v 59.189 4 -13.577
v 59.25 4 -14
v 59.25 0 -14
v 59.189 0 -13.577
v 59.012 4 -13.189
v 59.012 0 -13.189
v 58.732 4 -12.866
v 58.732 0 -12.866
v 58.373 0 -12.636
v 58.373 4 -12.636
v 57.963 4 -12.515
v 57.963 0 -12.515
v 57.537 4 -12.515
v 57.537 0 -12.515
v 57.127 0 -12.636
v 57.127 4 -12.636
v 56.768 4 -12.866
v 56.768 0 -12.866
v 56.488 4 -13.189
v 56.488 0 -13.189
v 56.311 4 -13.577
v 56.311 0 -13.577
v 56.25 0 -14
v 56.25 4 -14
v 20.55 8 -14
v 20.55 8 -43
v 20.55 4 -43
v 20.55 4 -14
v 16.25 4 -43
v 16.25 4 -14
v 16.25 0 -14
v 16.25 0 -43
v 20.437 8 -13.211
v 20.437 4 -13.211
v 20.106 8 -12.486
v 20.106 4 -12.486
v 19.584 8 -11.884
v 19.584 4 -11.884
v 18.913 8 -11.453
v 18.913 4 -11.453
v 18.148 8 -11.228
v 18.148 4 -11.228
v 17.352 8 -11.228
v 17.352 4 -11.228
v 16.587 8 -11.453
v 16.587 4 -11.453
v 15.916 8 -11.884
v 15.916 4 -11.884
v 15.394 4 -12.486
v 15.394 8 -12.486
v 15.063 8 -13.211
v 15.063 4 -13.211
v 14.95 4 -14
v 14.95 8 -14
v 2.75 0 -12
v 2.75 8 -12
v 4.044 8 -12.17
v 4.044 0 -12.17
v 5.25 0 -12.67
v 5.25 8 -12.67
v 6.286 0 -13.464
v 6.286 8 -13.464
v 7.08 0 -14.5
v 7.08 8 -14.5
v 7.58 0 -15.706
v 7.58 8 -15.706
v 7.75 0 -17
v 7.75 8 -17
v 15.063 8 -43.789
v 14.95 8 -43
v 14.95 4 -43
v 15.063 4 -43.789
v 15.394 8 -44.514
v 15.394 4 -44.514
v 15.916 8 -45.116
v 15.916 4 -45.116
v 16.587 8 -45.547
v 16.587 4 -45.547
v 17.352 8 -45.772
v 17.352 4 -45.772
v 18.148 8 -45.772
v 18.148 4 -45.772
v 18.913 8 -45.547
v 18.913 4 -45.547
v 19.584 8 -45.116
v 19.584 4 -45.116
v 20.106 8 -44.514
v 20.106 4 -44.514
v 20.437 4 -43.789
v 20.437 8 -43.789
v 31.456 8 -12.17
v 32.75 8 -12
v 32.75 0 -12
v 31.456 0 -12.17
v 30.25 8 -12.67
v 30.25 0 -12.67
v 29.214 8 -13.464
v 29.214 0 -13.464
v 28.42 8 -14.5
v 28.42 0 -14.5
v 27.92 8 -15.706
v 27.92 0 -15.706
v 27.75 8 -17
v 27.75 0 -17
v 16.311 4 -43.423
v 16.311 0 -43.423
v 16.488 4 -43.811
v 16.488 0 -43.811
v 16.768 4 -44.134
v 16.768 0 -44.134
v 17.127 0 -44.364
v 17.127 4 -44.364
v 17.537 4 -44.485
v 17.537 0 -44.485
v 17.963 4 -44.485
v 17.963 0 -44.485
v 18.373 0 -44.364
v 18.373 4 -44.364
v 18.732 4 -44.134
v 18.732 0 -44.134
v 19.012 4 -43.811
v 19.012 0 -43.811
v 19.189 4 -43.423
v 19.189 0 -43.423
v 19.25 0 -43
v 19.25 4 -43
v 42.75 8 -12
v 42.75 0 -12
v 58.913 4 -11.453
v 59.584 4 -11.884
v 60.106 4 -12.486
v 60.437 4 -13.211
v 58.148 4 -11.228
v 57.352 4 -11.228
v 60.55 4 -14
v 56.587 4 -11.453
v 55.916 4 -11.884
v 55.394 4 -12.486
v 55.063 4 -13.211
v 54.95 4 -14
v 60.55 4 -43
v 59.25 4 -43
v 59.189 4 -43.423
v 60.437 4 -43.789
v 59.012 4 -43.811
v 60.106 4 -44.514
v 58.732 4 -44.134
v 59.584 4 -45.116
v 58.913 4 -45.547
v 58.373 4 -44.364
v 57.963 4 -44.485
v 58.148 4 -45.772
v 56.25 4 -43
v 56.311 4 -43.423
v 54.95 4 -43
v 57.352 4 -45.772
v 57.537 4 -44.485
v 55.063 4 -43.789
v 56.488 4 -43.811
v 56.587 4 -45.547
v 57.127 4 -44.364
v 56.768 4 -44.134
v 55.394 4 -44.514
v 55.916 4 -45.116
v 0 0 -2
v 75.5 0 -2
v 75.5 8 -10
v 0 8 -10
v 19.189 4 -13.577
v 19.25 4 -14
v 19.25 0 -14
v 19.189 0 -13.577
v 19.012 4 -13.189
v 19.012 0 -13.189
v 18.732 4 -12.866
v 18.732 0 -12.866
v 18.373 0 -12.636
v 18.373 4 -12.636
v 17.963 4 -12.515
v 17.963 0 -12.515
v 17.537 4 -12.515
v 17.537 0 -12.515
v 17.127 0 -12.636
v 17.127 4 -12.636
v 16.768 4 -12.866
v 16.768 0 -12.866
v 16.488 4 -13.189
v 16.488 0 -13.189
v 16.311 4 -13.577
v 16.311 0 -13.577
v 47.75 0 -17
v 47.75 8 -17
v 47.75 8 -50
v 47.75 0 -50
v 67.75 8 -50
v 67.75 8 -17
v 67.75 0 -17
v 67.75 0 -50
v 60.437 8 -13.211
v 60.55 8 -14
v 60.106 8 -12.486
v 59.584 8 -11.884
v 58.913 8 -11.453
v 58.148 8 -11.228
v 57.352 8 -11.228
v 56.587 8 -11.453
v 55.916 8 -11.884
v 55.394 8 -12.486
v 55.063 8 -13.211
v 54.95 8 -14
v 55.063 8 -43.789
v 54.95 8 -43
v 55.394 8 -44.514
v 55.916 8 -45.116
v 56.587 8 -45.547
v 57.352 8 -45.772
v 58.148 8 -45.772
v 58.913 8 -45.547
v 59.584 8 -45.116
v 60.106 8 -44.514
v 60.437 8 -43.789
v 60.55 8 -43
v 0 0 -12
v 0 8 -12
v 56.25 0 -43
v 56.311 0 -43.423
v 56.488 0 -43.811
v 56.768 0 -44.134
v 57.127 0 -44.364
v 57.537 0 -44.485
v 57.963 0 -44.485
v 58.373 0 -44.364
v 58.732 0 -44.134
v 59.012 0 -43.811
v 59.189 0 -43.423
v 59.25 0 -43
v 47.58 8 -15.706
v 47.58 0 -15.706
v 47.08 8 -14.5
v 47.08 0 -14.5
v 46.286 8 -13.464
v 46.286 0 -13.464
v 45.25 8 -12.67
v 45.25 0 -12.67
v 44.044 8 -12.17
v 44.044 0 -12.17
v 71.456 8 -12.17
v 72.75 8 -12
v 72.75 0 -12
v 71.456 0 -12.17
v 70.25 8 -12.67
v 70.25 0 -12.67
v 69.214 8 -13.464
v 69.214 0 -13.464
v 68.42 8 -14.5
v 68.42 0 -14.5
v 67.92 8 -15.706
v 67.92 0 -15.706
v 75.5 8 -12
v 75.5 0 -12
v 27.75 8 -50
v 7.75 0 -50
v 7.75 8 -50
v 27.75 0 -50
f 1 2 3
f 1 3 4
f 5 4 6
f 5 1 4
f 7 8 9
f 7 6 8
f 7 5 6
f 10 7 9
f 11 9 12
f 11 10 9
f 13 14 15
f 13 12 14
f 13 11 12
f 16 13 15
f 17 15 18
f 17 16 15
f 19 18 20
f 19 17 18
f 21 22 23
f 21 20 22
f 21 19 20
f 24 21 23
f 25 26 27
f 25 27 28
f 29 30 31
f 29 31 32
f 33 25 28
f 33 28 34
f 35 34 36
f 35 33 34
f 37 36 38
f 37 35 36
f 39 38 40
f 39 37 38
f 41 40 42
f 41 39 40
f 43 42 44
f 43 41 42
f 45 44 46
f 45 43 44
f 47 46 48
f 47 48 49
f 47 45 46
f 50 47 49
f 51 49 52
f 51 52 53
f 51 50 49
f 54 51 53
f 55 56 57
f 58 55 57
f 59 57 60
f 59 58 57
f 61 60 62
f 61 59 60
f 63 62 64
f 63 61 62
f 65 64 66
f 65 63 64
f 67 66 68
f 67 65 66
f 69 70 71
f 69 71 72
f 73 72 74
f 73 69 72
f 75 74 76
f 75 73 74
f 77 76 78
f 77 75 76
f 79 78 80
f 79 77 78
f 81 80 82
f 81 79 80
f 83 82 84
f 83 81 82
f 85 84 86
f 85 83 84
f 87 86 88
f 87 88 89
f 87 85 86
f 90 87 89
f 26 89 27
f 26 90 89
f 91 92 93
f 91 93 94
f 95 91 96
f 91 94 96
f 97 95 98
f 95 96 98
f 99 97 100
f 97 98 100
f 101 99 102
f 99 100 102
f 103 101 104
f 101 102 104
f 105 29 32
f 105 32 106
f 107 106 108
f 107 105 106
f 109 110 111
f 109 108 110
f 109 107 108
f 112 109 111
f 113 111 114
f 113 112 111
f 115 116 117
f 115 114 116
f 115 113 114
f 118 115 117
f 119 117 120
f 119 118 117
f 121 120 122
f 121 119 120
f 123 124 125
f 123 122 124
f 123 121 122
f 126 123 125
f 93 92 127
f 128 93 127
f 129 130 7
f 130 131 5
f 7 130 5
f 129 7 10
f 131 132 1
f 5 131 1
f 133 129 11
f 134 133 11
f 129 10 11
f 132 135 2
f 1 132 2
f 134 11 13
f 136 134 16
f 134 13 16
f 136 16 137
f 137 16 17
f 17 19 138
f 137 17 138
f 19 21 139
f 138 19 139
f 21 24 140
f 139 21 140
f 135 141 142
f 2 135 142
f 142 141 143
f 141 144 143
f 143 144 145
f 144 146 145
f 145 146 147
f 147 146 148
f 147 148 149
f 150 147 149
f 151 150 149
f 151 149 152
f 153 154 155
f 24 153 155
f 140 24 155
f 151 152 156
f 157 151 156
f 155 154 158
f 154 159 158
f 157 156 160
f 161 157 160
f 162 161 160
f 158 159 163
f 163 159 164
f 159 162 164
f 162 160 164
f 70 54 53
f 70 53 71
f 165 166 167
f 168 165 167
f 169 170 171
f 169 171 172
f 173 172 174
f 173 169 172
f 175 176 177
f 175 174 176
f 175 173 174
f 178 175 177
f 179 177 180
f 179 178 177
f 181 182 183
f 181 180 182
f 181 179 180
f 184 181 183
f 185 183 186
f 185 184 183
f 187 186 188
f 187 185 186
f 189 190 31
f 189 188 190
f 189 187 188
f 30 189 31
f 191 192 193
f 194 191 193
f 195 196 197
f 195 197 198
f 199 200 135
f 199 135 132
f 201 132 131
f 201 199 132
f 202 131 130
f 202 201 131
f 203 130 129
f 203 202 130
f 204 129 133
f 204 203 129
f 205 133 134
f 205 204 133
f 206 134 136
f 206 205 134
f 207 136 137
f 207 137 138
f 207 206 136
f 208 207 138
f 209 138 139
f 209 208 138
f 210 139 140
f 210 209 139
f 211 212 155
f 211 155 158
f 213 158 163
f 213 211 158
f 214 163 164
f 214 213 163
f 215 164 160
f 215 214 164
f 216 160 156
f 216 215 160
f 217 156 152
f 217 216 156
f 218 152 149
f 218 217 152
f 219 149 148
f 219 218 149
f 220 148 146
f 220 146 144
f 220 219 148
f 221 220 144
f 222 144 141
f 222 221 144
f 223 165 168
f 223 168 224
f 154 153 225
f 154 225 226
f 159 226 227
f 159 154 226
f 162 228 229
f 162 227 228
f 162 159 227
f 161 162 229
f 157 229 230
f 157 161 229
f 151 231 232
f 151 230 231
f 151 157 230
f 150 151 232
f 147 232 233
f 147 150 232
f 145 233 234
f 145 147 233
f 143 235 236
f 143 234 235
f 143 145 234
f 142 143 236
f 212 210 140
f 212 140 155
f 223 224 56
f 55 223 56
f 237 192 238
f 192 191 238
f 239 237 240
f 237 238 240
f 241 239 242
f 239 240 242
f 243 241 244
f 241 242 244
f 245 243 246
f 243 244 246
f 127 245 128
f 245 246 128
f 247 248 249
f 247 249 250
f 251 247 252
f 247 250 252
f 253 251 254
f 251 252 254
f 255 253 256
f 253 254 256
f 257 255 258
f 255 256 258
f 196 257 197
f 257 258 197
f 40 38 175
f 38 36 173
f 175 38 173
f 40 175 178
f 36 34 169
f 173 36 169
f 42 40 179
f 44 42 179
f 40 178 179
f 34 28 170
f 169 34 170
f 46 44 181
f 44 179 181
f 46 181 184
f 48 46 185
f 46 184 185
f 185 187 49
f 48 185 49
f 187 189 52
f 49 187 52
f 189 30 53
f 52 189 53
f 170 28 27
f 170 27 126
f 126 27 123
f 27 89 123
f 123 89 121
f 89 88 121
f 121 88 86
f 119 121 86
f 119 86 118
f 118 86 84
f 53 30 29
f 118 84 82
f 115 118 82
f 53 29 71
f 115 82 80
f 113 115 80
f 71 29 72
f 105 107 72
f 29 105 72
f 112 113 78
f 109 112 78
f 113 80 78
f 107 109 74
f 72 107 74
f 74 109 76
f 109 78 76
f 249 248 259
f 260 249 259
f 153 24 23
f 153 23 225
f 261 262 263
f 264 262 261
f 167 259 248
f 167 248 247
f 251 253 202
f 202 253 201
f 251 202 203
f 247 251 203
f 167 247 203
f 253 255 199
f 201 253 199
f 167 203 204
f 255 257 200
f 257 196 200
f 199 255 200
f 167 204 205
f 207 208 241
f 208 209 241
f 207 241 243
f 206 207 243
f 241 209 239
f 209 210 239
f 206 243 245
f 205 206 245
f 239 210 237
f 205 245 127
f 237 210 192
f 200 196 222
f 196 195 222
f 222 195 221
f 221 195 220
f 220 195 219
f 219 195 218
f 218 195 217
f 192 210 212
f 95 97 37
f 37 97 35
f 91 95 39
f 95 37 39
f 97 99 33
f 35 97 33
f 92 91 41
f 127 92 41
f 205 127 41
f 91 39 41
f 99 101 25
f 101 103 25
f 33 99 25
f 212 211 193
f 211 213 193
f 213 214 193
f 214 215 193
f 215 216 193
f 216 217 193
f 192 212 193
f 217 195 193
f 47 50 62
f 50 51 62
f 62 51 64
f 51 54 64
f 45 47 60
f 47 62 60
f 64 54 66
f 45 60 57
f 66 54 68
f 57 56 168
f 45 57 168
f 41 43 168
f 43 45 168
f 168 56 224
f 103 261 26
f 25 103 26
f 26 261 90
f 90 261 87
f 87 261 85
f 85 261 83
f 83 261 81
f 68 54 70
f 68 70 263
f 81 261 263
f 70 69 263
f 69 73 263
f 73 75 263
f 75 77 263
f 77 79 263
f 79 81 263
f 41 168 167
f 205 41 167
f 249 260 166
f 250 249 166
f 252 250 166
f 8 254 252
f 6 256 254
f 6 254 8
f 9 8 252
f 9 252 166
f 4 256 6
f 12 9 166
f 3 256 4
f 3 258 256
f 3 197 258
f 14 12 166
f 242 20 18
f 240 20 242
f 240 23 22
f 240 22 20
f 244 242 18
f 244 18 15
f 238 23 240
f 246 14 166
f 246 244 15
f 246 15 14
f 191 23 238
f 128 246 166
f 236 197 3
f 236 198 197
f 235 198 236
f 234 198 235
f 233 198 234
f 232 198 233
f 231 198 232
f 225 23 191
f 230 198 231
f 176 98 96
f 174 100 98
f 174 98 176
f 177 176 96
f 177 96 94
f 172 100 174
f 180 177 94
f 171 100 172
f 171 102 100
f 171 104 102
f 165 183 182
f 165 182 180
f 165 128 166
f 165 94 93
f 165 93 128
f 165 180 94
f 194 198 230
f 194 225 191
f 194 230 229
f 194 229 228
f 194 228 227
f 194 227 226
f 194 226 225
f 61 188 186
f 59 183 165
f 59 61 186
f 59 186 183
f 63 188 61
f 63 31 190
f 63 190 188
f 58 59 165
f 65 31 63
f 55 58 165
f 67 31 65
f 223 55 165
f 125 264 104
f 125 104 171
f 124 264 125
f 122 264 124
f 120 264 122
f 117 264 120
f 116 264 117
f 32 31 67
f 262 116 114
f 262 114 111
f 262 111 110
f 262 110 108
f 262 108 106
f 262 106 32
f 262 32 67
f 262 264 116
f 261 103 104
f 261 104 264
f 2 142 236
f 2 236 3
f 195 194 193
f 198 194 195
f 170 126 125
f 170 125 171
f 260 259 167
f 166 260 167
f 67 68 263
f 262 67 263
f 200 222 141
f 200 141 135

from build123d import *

# Parameters (mm, degrees)
BOSS_EXTRUDE1_DEPTH = 8
CUT_EXTRUDE2_REACH  = 92.908
SKETCH5_W           = 20
SKETCH5_H           = 38
SKETCH5_W_2         = 7.75
CUT_EXTRUDE3_DEPTH  = 10
FILLET1_R           = 5
CHAMFER1_SIZE       = 10
CUT_EXTRUDE4_DEPTH  = 4


with BuildPart() as part:
    # Sketch1 → Boss-Extrude1 (new body)
    with BuildSketch(Plane(origin=(0, 0, 0), x_dir=(1, 0, 0), z_dir=(0, 1, 0))):
        Polygon((0, 0), (0, 50), (75.5, 50), (75.5, 0), (37.75, 0), align=None)
    extrude(amount=BOSS_EXTRUDE1_DEPTH)

    # Sketch4 → Cut-Extrude2 (cut, up to next)
    with BuildSketch(Plane(origin=(0, 8, 0), x_dir=(1, 0, 0), z_dir=(0, 1, 0)), mode=Mode.PRIVATE) as cut_extrude2_sk1:
        with BuildLine():
            Line((19.25, 43), (19.25, 14))
            ThreePointArc((19.25, 14), (17.75, 12.5), (16.25, 14))
            Line((16.25, 14), (16.25, 43))
            ThreePointArc((16.25, 43), (17.75, 44.5), (19.25, 43))
        make_face()
    cut_extrude2_tool1 = extrude(cut_extrude2_sk1.sketch, amount=-CUT_EXTRUDE2_REACH, mode=Mode.PRIVATE) & part.part
    # Sketch4 → Cut-Extrude2 (cut, up to next)
    with BuildSketch(Plane(origin=(0, 8, 0), x_dir=(1, 0, 0), z_dir=(0, 1, 0)), mode=Mode.PRIVATE) as cut_extrude2_sk2:
        with BuildLine():
            Line((59.25, 43), (59.25, 14))
            ThreePointArc((59.25, 14), (57.75, 12.5), (56.25, 14))
            Line((56.25, 14), (56.25, 43))
            ThreePointArc((56.25, 43), (57.75, 44.5), (59.25, 43))
        make_face()
    cut_extrude2_tool2 = extrude(cut_extrude2_sk2.sketch, amount=-CUT_EXTRUDE2_REACH, mode=Mode.PRIVATE) & part.part
    add(cut_extrude2_tool1.solids().sort_by_distance((17.75, 8, -28.5))[0], mode=Mode.SUBTRACT)
    add(cut_extrude2_tool2.solids().sort_by_distance((57.75, 8, -28.5))[0], mode=Mode.SUBTRACT)

    # Sketch5 → Cut-Extrude3 (cut)
    with BuildSketch(Plane(origin=(0, 8, 0), x_dir=(1, 0, 0), z_dir=(0, 1, 0))):
        with Locations((37.75, 31)):
            Rectangle(SKETCH5_W, SKETCH5_H)
        with Locations((71.625, 31)):
            Rectangle(SKETCH5_W_2, SKETCH5_H)
        with Locations((3.875, 31)):
            Rectangle(SKETCH5_W_2, SKETCH5_H)
    extrude(amount=-CUT_EXTRUDE3_DEPTH, mode=Mode.SUBTRACT)

    # Fillet1
    fillet1_edges = [part.edges().sort_by_distance(p)[0] for p in [
        (27.75, 4, -12),
        (47.75, 4, -12),
        (7.75, 4, -12),
        (67.75, 4, -12),
    ]]
    fillet(fillet1_edges, radius=FILLET1_R)

    # Chamfer1
    # the kernel refuses this chamfer: 10 mm, written as the material it takes off along each edge
    with BuildSketch(Plane(origin=(101.21682988, 8, 0), x_dir=(0, -0.9996219169112968, 0.027495876610586372), z_dir=(-1, 0, 0))) as chamfer1_piece_1:
        Polygon((CHAMFER1_SIZE * 0.999621916911, -CHAMFER1_SIZE * 0.0274958766106), (-CHAMFER1_SIZE * 0.0274958766106, -CHAMFER1_SIZE * 0.999621916911), (0, 0), align=None)
    extrude(amount=126.933659759, mode=Mode.SUBTRACT)

    # Sketch7 → Cut-Extrude4 (cut)
    with BuildSketch(Plane(origin=(0, 8, 0), x_dir=(1, 0, 0), z_dir=(0, 1, 0))):
        with BuildLine():
            Line((20.55, 43), (20.55, 14))
            ThreePointArc((20.55, 14), (17.75, 11.2), (14.95, 14))
            Line((14.95, 14), (14.95, 43))
            ThreePointArc((14.95, 43), (17.75, 45.8), (20.55, 43))
        make_face()
        with BuildLine():
            Line((60.55, 43), (60.55, 14))
            ThreePointArc((60.55, 14), (57.75, 11.2), (54.95, 14))
            Line((54.95, 14), (54.95, 43))
            ThreePointArc((54.95, 43), (57.75, 45.8), (60.55, 43))
        make_face()
    extrude(amount=-CUT_EXTRUDE4_DEPTH, mode=Mode.SUBTRACT)


solid = part.part
